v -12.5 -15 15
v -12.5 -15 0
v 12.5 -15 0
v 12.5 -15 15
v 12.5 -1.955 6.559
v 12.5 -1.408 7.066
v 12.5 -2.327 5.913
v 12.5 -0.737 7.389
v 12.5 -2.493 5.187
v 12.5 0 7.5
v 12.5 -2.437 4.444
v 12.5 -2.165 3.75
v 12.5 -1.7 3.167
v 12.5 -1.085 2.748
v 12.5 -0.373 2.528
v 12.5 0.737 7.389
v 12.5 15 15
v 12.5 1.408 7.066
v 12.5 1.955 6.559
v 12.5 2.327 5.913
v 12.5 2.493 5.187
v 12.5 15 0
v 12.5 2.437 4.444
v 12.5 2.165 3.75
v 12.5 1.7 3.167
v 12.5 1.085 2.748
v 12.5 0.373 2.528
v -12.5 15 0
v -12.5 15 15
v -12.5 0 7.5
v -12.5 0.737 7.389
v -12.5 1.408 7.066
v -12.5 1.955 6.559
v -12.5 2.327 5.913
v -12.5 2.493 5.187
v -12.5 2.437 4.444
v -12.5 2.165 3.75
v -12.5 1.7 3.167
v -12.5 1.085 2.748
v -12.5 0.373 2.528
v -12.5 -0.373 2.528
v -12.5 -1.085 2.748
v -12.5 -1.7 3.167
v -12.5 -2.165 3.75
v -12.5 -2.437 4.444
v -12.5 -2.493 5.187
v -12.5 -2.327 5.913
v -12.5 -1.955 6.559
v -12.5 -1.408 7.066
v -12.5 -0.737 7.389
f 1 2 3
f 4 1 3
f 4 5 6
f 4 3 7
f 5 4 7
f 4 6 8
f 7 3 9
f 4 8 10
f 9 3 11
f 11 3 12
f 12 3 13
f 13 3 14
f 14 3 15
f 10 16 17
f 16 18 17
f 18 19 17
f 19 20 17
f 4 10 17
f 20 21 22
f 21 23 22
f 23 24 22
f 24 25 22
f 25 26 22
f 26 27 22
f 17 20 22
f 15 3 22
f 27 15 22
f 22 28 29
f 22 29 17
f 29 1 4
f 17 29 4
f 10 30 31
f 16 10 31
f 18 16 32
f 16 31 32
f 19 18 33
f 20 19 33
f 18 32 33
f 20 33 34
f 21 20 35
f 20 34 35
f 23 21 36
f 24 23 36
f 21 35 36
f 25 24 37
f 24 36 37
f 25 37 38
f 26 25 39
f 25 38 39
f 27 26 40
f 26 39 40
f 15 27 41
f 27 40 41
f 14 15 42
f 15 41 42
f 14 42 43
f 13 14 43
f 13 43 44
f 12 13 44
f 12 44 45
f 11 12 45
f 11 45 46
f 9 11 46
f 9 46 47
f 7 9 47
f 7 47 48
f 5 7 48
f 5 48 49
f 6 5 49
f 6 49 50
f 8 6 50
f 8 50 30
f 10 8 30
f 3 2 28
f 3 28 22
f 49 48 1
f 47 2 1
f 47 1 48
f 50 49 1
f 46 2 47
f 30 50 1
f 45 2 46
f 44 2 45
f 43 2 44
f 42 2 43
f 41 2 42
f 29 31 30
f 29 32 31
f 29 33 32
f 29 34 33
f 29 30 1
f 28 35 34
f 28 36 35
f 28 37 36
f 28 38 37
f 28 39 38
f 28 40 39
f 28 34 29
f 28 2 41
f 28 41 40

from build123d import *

# Parameters (mm, degrees)
SKETCH1_W           = 25
SKETCH1_H           = 30
BOSS_EXTRUDE1_DEPTH = 15
SKETCH2_R           = 2.5
CUT_EXTRUDE1_DEPTH  = 26


with BuildPart() as part:
    # Sketch1 → Boss-Extrude1 (new body)
    with BuildSketch(Plane.XY):
        Rectangle(SKETCH1_W, SKETCH1_H)
    extrude(amount=BOSS_EXTRUDE1_DEPTH)

    # Sketch2 → Cut-Extrude1 (cut)
    with BuildSketch(Plane.ZY.offset(12.5)):
        with Locations((5, 0)):
            Circle(SKETCH2_R)
    extrude(amount=-CUT_EXTRUDE1_DEPTH, mode=Mode.SUBTRACT)


solid = part.part
